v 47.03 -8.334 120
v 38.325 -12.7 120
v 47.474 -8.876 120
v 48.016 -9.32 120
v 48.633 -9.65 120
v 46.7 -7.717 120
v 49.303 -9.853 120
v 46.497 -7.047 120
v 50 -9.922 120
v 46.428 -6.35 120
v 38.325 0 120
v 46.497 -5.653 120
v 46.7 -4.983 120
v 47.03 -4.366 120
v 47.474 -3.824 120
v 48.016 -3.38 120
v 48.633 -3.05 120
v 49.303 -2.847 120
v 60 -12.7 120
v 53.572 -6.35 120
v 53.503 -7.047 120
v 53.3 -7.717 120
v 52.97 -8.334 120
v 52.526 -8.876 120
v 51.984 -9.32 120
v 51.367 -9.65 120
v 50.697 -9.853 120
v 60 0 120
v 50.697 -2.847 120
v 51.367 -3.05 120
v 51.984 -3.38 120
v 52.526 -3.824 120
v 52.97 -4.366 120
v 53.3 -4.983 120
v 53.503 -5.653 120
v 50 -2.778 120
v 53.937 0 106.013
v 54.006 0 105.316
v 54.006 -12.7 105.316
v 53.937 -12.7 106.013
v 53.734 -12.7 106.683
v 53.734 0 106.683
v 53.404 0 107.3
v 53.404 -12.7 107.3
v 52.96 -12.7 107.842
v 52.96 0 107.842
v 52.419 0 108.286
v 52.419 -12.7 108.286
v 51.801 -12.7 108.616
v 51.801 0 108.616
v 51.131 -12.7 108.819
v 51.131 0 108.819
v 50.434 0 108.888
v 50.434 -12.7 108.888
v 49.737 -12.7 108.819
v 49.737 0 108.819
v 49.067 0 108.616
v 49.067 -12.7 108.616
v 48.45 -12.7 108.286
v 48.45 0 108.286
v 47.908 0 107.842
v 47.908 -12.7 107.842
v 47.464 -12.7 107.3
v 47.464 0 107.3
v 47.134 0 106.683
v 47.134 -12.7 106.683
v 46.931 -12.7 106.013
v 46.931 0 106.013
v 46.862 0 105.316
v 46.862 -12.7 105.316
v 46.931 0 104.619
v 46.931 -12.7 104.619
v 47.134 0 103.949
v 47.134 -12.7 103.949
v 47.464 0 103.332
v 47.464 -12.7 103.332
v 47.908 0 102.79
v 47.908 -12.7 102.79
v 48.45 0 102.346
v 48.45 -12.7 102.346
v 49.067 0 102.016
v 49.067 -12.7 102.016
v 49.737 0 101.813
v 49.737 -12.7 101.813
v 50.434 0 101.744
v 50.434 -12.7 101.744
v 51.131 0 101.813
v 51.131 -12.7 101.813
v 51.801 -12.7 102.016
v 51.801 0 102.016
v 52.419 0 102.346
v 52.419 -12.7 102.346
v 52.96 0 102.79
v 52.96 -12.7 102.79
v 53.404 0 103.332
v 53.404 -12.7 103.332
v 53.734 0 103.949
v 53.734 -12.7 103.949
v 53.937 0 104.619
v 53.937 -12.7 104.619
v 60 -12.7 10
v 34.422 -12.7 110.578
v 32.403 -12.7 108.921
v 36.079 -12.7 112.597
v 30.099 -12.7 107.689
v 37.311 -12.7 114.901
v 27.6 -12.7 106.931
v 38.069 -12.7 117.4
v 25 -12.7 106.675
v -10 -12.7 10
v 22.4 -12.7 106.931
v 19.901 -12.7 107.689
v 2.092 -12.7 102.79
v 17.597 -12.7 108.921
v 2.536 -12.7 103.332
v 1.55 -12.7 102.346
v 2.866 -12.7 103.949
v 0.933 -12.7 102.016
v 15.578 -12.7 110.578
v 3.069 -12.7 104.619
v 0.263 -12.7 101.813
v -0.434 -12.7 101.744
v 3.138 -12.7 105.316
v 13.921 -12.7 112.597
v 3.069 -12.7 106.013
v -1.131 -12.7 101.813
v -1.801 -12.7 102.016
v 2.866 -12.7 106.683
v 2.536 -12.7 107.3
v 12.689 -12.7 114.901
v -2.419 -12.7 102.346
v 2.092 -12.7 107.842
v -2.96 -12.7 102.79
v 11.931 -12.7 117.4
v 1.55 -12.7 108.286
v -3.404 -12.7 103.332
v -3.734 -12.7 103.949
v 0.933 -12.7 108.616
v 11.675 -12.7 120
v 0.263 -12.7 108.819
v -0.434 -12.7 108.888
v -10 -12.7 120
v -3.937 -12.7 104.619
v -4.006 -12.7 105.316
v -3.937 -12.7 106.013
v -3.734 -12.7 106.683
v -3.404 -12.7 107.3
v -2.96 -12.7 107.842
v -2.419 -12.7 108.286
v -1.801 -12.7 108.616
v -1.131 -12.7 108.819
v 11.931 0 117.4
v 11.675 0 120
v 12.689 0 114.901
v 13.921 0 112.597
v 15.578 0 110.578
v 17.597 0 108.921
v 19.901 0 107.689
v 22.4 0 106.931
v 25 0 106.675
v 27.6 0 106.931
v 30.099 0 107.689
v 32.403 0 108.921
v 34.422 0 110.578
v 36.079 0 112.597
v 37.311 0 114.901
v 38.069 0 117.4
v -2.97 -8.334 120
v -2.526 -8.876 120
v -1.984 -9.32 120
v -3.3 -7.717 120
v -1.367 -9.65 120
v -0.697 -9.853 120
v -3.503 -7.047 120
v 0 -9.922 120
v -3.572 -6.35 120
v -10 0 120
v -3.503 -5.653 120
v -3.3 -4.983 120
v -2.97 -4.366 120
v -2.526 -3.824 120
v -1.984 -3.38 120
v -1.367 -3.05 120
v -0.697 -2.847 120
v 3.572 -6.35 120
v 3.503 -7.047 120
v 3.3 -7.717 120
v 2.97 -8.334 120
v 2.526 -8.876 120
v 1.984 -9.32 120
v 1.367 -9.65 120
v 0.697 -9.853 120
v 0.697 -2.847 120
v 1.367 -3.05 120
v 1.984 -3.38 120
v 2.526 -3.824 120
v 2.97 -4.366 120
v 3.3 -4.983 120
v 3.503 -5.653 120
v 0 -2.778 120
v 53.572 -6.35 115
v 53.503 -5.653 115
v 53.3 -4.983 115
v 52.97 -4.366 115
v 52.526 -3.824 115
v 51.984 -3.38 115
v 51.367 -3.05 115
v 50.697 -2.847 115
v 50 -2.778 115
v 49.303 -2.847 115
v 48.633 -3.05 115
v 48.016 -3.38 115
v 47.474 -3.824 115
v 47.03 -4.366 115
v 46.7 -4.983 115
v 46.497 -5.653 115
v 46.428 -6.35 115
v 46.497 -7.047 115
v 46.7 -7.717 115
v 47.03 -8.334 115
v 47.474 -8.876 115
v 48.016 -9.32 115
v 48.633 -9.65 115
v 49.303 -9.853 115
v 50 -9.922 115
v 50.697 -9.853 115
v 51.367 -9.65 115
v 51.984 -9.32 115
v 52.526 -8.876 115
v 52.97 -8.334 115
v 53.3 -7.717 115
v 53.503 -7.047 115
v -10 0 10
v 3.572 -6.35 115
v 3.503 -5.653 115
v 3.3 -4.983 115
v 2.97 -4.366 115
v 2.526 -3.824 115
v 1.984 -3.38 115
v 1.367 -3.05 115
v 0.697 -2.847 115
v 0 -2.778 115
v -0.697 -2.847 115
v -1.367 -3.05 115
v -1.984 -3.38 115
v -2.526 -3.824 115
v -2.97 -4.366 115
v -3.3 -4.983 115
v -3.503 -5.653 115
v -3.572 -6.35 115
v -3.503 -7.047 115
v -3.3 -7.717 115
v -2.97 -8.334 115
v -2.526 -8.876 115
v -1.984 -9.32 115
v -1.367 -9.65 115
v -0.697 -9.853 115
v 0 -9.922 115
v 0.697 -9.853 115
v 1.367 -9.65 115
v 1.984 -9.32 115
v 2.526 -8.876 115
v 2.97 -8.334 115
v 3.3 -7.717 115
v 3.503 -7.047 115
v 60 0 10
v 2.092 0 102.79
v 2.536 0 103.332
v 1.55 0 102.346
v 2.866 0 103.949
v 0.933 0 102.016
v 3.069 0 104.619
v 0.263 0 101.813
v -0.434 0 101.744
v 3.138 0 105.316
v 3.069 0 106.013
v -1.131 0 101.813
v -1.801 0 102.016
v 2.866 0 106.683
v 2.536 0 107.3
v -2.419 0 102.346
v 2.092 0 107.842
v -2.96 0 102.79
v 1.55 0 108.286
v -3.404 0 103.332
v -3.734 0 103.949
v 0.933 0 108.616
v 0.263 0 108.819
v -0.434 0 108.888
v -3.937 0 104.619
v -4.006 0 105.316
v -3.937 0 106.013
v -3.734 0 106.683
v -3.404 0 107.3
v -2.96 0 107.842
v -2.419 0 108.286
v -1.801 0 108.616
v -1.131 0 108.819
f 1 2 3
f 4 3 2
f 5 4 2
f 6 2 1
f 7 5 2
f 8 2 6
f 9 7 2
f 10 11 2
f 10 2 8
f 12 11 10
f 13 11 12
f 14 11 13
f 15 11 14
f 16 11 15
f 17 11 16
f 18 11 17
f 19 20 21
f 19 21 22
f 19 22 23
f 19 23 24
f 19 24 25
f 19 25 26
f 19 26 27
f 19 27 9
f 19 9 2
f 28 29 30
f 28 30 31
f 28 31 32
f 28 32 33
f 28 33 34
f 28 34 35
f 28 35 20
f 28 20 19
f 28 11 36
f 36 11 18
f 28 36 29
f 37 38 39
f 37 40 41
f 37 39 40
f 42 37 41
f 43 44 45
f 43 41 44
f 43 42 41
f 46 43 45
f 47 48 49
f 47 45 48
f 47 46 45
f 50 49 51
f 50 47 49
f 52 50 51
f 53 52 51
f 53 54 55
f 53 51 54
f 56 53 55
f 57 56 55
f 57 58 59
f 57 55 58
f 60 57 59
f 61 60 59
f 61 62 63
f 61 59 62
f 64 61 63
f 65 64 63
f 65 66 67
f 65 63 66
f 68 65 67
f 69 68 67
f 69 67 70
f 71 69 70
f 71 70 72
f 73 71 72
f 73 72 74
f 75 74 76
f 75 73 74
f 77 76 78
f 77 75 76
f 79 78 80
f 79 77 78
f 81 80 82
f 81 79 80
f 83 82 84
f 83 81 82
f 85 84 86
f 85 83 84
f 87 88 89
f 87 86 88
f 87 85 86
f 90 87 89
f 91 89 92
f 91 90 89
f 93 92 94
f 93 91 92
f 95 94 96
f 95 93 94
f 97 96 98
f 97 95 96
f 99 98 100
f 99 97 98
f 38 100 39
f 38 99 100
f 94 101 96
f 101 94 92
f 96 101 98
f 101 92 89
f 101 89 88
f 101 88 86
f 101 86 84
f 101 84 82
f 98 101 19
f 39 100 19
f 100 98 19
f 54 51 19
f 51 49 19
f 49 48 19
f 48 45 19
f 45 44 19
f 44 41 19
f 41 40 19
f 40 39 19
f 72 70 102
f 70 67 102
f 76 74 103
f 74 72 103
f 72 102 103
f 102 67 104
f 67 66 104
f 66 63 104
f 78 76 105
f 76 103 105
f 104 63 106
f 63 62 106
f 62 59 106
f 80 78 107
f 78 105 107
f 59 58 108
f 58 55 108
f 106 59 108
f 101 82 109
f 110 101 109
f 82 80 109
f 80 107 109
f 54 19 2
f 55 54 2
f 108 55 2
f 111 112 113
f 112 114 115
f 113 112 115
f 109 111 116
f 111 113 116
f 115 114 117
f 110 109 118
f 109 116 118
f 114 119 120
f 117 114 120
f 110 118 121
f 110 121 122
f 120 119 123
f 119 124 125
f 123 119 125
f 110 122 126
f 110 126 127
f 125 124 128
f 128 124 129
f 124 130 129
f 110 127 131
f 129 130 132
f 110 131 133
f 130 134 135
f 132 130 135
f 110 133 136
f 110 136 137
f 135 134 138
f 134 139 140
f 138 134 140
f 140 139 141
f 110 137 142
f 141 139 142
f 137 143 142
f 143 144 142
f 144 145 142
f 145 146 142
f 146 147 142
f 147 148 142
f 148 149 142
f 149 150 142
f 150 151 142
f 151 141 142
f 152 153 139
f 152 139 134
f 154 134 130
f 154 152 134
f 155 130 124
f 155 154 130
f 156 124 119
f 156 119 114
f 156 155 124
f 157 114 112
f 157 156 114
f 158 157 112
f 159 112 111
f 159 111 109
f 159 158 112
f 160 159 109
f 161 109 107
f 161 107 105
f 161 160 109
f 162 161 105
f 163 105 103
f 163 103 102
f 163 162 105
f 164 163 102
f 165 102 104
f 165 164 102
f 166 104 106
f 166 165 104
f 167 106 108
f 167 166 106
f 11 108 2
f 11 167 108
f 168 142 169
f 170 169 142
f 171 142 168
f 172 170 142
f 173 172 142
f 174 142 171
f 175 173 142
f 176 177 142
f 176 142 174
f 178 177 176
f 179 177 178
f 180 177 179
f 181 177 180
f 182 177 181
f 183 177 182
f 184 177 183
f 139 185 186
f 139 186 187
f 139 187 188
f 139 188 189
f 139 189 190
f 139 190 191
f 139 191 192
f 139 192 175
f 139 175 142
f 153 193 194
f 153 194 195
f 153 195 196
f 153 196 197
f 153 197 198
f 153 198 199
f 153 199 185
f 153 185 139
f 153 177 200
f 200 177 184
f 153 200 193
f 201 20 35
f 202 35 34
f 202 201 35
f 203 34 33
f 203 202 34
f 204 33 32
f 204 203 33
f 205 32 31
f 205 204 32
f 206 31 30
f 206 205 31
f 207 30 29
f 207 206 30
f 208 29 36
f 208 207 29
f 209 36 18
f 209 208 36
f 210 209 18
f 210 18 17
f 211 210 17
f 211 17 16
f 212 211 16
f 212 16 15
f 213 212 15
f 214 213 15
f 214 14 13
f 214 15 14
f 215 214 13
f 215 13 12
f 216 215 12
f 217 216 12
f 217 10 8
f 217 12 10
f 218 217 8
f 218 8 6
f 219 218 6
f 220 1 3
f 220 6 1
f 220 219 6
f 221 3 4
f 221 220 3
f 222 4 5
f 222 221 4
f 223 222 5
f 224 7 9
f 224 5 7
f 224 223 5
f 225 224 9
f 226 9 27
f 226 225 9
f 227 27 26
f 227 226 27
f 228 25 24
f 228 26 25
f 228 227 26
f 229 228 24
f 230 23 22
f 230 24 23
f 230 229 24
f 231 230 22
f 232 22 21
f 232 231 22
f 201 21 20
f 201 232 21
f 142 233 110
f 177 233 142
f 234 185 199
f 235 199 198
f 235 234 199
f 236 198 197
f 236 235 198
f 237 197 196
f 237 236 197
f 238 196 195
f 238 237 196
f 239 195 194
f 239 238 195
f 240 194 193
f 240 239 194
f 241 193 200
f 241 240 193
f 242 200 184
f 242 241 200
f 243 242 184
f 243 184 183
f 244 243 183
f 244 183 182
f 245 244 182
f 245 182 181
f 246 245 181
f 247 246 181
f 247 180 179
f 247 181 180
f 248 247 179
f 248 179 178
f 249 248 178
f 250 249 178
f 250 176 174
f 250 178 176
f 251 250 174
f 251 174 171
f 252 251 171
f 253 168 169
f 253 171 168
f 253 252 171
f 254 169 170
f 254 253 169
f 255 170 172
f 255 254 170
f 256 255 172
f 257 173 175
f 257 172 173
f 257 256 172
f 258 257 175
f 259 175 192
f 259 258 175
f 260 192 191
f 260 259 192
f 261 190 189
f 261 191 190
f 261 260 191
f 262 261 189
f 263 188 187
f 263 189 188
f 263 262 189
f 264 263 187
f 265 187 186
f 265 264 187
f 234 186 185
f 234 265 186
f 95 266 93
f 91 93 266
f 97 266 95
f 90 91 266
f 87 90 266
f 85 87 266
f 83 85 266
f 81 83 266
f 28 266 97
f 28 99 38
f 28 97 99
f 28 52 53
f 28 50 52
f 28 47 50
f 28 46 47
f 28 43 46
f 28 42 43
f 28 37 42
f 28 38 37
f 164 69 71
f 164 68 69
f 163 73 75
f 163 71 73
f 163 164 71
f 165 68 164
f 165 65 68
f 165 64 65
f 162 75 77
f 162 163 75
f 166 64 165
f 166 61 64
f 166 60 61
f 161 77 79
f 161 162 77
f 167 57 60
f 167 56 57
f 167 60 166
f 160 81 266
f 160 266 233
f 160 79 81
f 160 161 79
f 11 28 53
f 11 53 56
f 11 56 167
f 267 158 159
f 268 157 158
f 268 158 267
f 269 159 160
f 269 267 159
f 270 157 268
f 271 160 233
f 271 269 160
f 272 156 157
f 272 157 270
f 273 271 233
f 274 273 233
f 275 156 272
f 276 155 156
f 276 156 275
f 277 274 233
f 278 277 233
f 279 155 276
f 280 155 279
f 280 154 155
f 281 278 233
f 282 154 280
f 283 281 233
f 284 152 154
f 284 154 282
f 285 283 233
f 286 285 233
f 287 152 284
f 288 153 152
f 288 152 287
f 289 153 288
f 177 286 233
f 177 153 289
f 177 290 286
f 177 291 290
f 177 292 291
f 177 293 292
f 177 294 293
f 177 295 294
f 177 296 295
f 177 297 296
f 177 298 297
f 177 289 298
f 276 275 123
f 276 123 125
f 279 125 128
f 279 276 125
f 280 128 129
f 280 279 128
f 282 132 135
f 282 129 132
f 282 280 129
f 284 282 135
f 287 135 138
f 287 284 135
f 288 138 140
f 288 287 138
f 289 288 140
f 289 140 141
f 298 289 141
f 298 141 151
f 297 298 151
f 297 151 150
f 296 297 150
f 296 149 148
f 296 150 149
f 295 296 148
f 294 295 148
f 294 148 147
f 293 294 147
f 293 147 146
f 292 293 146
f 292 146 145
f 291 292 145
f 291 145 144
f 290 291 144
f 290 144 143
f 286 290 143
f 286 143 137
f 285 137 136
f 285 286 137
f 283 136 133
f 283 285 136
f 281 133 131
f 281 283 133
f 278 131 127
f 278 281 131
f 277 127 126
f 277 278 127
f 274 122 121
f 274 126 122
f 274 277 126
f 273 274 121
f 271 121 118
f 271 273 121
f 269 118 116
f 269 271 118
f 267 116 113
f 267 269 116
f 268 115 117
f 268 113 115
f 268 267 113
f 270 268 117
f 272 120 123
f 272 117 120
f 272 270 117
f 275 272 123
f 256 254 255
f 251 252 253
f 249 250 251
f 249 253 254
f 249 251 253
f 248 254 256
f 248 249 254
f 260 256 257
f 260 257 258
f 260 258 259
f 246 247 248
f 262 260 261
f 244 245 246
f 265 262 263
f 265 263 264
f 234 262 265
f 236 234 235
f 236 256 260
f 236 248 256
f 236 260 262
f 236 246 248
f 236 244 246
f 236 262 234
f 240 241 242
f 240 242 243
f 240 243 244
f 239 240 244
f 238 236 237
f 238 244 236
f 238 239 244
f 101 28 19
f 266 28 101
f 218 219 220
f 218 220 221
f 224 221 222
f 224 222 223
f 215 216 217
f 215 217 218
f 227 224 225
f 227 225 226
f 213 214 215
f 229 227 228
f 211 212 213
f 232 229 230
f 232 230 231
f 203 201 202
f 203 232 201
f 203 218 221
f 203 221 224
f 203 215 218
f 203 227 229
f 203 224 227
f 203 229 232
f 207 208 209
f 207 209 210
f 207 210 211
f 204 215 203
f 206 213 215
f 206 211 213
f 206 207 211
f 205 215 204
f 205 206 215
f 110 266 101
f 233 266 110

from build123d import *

# Parameters (mm, degrees)
SKETCH026_R  = 3.571875
PAD026_DEPTH = 6
SKETCH025_R  = 3.571875
PAD025_DEPTH = 6
SKETCH024_R  = 3.571875
PAD024_DEPTH = 50
SKETCH023_R  = 3.571875
PAD023_DEPTH = 33.7
PAD001_DEPTH = 12.7


with BuildPart() as body026:
    # Sketch026 → Pad026 (new body)
    with BuildSketch(Plane.XY):
        Circle(SKETCH026_R)
    extrude(amount=PAD026_DEPTH)


with BuildPart() as body026_1:
    # Body026 placement: moved
    add(body026.part.moved(Location((150, -6.35, 115))))


with BuildPart() as body025:
    # Sketch025 → Pad025 (new body)
    with BuildSketch(Plane.XY):
        Circle(SKETCH025_R)
    extrude(amount=PAD025_DEPTH)


with BuildPart() as body025_1:
    # Body025 placement: moved
    add(body025.part.moved(Location((100, -6.35, 115))))


with BuildPart() as body024:
    # Sketch024 → Pad024 (new body)
    with BuildSketch(Plane.XZ):
        Circle(SKETCH024_R)
    extrude(amount=PAD024_DEPTH)


with BuildPart() as body024_1:
    # Body024 placement: moved
    add(body024.part.moved(Location((50.4341, 10, 105.316))))


with BuildPart() as body023:
    # Sketch023 → Pad023 (new body)
    with BuildSketch(Plane.XZ):
        Circle(SKETCH023_R)
    extrude(amount=PAD023_DEPTH)


with BuildPart() as body023_1:
    # Body023 placement: moved
    add(body023.part.moved(Location((-0.434083, 5, 105.316))))


with BuildPart() as bracelower001:
    # Sketch001 → Pad001 (new body)
    with BuildSketch(Plane.XZ):
        with BuildLine():
            Line((0, 0), (0, 110))
            Line((0, 110), (21.675, 110))
            ThreePointArc((21.675, 110), (35, 96.674972), (48.325, 110))
            Line((48.325, 110), (70, 110))
            Line((70, 110), (70, 0))
            Line((70, 0), (0, 0))
        make_face()
    extrude(amount=PAD001_DEPTH)


with BuildPart() as bracelower001_1:
    # Body001 placement: moved
    add(bracelower001.part.moved(Location((-10, 0, 10))))

    # Cut016: cut Body023
    add(body023_1.part, mode=Mode.SUBTRACT)

    # Cut017: cut Body024
    add(body024_1.part, mode=Mode.SUBTRACT)


with BuildPart() as bracelower001_2:
    # Cut017 placement: moved
    add(bracelower001_1.part.moved(Location((100, 0, 0))))

    # Cut018: cut Body025
    add(body025_1.part, mode=Mode.SUBTRACT)

    # Cut019: cut Body026
    add(body026_1.part, mode=Mode.SUBTRACT)


with BuildPart() as bracelower001_3:
    # Cut019 placement: moved
    add(bracelower001_2.part.moved(Location((-100, 0, 0))))


solid = bracelower001_3.part
